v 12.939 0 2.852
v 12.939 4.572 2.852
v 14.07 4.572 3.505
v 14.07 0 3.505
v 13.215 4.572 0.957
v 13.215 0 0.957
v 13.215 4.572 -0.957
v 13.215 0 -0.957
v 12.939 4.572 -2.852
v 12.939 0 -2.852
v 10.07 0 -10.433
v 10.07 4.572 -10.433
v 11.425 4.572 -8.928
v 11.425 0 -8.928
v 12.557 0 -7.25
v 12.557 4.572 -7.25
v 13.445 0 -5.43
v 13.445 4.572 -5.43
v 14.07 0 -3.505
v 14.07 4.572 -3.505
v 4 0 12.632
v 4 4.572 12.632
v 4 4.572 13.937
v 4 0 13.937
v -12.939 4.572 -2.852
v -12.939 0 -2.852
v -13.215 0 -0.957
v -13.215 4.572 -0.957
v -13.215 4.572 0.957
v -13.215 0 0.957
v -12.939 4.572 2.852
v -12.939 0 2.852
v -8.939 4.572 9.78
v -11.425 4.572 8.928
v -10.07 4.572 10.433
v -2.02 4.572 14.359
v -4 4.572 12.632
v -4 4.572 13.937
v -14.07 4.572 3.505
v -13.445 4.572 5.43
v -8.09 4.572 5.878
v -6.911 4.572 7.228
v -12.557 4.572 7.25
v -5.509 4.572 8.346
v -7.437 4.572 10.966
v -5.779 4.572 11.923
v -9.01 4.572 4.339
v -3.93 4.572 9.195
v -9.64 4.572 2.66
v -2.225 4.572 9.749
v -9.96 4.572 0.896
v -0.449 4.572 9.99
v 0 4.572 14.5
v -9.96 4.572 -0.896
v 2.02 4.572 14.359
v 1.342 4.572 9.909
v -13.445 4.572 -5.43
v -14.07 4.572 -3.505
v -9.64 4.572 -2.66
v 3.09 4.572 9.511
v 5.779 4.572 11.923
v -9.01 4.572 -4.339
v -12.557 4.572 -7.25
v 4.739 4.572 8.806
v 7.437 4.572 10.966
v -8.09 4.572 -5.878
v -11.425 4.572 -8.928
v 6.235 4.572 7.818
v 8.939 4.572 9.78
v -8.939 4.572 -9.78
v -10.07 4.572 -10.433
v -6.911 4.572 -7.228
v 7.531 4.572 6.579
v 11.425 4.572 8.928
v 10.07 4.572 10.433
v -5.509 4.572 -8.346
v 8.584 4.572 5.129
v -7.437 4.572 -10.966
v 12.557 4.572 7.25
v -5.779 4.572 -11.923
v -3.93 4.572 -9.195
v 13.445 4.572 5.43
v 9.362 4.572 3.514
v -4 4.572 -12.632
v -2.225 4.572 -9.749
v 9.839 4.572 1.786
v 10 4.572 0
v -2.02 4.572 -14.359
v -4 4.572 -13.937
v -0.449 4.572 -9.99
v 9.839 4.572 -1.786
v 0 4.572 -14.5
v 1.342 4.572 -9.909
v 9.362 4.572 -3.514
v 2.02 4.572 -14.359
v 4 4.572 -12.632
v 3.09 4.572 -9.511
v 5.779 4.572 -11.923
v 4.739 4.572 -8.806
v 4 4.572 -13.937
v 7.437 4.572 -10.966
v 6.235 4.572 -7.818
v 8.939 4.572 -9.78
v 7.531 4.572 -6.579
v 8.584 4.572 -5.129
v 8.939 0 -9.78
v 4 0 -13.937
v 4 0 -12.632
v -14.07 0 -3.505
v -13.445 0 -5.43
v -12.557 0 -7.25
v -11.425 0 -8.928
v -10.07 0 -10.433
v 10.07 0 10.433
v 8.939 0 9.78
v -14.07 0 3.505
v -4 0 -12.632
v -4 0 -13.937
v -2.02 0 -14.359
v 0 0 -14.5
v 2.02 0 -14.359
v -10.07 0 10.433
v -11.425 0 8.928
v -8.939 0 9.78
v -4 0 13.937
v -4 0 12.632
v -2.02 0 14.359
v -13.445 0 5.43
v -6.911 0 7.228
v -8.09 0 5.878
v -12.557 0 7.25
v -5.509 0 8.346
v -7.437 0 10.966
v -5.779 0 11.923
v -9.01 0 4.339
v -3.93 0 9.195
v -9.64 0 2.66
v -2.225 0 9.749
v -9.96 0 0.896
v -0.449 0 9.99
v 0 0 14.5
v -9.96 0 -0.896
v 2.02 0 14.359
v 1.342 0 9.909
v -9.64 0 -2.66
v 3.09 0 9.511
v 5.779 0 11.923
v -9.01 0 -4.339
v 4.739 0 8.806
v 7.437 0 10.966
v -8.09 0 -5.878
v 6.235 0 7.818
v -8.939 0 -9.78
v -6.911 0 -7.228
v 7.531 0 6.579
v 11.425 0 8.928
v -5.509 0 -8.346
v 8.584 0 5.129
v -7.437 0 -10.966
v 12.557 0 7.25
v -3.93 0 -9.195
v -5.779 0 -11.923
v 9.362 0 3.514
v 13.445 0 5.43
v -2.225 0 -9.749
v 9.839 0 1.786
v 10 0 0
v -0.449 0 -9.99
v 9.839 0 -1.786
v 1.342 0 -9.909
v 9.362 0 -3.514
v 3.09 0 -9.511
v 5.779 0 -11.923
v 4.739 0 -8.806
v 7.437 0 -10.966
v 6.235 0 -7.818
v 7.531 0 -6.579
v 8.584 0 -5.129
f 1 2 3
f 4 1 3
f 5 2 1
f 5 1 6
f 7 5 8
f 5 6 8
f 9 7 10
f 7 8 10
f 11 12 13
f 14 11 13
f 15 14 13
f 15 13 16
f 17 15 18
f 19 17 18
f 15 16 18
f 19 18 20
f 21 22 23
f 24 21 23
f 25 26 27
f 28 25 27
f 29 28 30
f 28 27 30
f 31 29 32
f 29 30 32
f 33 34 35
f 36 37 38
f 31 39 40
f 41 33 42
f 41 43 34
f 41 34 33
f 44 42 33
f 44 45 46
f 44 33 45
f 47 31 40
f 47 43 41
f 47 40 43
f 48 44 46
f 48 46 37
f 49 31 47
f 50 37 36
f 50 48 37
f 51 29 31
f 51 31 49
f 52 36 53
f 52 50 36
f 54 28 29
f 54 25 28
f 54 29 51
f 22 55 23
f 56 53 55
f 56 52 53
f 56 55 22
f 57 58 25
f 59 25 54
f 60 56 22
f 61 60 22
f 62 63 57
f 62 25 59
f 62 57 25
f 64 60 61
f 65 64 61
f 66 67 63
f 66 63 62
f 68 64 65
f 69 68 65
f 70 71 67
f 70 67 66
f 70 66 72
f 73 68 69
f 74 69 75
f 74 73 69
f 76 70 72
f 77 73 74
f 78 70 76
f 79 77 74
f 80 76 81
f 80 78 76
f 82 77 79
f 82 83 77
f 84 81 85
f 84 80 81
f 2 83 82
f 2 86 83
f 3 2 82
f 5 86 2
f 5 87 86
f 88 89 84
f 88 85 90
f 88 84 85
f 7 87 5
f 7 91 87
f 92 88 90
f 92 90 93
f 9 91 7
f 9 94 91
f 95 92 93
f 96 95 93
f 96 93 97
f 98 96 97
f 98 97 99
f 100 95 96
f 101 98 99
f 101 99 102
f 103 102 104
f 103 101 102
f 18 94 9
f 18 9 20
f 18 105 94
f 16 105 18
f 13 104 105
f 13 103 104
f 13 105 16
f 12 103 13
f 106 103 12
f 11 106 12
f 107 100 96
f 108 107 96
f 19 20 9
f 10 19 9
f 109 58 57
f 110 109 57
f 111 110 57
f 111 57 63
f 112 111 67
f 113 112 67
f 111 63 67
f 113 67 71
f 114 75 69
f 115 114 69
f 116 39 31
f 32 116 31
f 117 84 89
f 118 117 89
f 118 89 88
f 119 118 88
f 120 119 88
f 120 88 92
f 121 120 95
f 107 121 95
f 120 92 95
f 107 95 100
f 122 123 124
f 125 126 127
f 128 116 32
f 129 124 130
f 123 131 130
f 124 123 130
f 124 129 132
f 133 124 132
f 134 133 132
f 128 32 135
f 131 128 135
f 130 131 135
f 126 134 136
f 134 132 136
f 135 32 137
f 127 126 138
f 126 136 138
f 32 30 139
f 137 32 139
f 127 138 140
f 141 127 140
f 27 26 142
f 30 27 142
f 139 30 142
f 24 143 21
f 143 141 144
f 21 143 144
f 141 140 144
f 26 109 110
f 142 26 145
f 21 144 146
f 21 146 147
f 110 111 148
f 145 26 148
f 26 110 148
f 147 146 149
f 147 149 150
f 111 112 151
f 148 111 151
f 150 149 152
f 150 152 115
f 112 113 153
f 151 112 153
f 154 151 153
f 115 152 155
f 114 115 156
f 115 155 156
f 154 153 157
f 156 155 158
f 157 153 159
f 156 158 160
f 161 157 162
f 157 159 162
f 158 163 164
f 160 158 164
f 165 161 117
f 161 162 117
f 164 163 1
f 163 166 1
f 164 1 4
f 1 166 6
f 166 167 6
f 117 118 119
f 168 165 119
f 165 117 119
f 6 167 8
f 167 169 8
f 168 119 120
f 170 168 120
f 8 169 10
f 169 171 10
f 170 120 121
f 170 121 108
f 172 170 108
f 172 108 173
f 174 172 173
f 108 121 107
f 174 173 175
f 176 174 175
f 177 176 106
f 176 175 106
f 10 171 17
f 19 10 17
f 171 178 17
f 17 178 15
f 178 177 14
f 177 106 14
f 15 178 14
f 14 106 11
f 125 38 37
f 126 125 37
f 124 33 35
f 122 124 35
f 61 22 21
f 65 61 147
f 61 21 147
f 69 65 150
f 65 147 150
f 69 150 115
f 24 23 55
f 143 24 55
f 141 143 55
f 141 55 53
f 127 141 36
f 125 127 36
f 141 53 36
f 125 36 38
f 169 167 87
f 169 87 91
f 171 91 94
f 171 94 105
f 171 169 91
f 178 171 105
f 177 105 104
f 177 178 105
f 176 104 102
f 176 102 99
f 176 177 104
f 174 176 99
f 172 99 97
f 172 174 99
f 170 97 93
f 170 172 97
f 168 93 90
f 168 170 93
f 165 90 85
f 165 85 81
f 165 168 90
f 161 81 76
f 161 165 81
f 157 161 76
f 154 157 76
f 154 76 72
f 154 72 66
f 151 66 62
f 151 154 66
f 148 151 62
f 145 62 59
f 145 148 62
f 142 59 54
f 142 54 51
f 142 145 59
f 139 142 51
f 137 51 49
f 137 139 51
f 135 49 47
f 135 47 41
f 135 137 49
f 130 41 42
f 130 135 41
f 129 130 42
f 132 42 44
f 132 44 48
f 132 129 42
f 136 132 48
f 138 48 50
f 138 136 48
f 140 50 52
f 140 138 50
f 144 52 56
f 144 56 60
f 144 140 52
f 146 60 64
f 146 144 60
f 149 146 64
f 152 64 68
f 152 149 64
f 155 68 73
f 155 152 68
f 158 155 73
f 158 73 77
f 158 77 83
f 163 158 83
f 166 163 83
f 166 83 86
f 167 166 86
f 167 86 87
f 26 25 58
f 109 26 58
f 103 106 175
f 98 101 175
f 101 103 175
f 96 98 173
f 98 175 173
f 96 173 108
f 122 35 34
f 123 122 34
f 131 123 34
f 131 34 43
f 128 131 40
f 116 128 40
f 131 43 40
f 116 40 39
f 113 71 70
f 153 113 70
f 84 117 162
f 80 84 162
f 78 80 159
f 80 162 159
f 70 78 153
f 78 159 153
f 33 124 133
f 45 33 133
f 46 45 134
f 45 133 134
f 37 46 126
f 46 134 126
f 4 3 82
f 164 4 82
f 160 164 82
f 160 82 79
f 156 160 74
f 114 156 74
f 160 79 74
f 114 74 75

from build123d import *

# Parameters (mm, degrees)
SKETCH1_R           = 13.25
SKETCH1_R_2         = 10
BOSS_EXTRUDE1_DEPTH = 4.572
BOSS_EXTRUDE2_DEPTH = 4.572
CIRPATTERN1_COUNT   = 6


with BuildPart() as part:
    # Sketch1 → Boss-Extrude1 (new body)
    with BuildSketch(Plane(origin=(0, 0, 0), x_dir=(1, 0, 0), z_dir=(0, 1, 0))):
        Circle(SKETCH1_R)
        Circle(SKETCH1_R_2, mode=Mode.SUBTRACT)
    extrude(amount=BOSS_EXTRUDE1_DEPTH)

    # Sketch2 → Boss-Extrude2 (add)
    with BuildSketch(Plane(origin=(0, 4.572, 0), x_dir=(1, 0, 0), z_dir=(0, 1, 0))):
        with BuildLine():
            Line((-4, 12.631805097), (-4, 13.937359865))
            ThreePointArc((-4, 13.937359865), (0, 14.5), (4, 13.937359865))
            Line((4, 13.937359865), (4, 12.631805097))
            ThreePointArc((4, 12.631805097), (0, 13.25), (-4, 12.631805097))
        make_face()
    boss_extrude2 = extrude(amount=-BOSS_EXTRUDE2_DEPTH)

    # CirPattern1: Boss-Extrude2 ×6 about axis
    cirpattern1_axis = Axis((0, 0, 0), (0, 1, 0))
    for i in range(1, CIRPATTERN1_COUNT):
        add(boss_extrude2.rotate(cirpattern1_axis, i * 360 / CIRPATTERN1_COUNT))


solid = part.part
